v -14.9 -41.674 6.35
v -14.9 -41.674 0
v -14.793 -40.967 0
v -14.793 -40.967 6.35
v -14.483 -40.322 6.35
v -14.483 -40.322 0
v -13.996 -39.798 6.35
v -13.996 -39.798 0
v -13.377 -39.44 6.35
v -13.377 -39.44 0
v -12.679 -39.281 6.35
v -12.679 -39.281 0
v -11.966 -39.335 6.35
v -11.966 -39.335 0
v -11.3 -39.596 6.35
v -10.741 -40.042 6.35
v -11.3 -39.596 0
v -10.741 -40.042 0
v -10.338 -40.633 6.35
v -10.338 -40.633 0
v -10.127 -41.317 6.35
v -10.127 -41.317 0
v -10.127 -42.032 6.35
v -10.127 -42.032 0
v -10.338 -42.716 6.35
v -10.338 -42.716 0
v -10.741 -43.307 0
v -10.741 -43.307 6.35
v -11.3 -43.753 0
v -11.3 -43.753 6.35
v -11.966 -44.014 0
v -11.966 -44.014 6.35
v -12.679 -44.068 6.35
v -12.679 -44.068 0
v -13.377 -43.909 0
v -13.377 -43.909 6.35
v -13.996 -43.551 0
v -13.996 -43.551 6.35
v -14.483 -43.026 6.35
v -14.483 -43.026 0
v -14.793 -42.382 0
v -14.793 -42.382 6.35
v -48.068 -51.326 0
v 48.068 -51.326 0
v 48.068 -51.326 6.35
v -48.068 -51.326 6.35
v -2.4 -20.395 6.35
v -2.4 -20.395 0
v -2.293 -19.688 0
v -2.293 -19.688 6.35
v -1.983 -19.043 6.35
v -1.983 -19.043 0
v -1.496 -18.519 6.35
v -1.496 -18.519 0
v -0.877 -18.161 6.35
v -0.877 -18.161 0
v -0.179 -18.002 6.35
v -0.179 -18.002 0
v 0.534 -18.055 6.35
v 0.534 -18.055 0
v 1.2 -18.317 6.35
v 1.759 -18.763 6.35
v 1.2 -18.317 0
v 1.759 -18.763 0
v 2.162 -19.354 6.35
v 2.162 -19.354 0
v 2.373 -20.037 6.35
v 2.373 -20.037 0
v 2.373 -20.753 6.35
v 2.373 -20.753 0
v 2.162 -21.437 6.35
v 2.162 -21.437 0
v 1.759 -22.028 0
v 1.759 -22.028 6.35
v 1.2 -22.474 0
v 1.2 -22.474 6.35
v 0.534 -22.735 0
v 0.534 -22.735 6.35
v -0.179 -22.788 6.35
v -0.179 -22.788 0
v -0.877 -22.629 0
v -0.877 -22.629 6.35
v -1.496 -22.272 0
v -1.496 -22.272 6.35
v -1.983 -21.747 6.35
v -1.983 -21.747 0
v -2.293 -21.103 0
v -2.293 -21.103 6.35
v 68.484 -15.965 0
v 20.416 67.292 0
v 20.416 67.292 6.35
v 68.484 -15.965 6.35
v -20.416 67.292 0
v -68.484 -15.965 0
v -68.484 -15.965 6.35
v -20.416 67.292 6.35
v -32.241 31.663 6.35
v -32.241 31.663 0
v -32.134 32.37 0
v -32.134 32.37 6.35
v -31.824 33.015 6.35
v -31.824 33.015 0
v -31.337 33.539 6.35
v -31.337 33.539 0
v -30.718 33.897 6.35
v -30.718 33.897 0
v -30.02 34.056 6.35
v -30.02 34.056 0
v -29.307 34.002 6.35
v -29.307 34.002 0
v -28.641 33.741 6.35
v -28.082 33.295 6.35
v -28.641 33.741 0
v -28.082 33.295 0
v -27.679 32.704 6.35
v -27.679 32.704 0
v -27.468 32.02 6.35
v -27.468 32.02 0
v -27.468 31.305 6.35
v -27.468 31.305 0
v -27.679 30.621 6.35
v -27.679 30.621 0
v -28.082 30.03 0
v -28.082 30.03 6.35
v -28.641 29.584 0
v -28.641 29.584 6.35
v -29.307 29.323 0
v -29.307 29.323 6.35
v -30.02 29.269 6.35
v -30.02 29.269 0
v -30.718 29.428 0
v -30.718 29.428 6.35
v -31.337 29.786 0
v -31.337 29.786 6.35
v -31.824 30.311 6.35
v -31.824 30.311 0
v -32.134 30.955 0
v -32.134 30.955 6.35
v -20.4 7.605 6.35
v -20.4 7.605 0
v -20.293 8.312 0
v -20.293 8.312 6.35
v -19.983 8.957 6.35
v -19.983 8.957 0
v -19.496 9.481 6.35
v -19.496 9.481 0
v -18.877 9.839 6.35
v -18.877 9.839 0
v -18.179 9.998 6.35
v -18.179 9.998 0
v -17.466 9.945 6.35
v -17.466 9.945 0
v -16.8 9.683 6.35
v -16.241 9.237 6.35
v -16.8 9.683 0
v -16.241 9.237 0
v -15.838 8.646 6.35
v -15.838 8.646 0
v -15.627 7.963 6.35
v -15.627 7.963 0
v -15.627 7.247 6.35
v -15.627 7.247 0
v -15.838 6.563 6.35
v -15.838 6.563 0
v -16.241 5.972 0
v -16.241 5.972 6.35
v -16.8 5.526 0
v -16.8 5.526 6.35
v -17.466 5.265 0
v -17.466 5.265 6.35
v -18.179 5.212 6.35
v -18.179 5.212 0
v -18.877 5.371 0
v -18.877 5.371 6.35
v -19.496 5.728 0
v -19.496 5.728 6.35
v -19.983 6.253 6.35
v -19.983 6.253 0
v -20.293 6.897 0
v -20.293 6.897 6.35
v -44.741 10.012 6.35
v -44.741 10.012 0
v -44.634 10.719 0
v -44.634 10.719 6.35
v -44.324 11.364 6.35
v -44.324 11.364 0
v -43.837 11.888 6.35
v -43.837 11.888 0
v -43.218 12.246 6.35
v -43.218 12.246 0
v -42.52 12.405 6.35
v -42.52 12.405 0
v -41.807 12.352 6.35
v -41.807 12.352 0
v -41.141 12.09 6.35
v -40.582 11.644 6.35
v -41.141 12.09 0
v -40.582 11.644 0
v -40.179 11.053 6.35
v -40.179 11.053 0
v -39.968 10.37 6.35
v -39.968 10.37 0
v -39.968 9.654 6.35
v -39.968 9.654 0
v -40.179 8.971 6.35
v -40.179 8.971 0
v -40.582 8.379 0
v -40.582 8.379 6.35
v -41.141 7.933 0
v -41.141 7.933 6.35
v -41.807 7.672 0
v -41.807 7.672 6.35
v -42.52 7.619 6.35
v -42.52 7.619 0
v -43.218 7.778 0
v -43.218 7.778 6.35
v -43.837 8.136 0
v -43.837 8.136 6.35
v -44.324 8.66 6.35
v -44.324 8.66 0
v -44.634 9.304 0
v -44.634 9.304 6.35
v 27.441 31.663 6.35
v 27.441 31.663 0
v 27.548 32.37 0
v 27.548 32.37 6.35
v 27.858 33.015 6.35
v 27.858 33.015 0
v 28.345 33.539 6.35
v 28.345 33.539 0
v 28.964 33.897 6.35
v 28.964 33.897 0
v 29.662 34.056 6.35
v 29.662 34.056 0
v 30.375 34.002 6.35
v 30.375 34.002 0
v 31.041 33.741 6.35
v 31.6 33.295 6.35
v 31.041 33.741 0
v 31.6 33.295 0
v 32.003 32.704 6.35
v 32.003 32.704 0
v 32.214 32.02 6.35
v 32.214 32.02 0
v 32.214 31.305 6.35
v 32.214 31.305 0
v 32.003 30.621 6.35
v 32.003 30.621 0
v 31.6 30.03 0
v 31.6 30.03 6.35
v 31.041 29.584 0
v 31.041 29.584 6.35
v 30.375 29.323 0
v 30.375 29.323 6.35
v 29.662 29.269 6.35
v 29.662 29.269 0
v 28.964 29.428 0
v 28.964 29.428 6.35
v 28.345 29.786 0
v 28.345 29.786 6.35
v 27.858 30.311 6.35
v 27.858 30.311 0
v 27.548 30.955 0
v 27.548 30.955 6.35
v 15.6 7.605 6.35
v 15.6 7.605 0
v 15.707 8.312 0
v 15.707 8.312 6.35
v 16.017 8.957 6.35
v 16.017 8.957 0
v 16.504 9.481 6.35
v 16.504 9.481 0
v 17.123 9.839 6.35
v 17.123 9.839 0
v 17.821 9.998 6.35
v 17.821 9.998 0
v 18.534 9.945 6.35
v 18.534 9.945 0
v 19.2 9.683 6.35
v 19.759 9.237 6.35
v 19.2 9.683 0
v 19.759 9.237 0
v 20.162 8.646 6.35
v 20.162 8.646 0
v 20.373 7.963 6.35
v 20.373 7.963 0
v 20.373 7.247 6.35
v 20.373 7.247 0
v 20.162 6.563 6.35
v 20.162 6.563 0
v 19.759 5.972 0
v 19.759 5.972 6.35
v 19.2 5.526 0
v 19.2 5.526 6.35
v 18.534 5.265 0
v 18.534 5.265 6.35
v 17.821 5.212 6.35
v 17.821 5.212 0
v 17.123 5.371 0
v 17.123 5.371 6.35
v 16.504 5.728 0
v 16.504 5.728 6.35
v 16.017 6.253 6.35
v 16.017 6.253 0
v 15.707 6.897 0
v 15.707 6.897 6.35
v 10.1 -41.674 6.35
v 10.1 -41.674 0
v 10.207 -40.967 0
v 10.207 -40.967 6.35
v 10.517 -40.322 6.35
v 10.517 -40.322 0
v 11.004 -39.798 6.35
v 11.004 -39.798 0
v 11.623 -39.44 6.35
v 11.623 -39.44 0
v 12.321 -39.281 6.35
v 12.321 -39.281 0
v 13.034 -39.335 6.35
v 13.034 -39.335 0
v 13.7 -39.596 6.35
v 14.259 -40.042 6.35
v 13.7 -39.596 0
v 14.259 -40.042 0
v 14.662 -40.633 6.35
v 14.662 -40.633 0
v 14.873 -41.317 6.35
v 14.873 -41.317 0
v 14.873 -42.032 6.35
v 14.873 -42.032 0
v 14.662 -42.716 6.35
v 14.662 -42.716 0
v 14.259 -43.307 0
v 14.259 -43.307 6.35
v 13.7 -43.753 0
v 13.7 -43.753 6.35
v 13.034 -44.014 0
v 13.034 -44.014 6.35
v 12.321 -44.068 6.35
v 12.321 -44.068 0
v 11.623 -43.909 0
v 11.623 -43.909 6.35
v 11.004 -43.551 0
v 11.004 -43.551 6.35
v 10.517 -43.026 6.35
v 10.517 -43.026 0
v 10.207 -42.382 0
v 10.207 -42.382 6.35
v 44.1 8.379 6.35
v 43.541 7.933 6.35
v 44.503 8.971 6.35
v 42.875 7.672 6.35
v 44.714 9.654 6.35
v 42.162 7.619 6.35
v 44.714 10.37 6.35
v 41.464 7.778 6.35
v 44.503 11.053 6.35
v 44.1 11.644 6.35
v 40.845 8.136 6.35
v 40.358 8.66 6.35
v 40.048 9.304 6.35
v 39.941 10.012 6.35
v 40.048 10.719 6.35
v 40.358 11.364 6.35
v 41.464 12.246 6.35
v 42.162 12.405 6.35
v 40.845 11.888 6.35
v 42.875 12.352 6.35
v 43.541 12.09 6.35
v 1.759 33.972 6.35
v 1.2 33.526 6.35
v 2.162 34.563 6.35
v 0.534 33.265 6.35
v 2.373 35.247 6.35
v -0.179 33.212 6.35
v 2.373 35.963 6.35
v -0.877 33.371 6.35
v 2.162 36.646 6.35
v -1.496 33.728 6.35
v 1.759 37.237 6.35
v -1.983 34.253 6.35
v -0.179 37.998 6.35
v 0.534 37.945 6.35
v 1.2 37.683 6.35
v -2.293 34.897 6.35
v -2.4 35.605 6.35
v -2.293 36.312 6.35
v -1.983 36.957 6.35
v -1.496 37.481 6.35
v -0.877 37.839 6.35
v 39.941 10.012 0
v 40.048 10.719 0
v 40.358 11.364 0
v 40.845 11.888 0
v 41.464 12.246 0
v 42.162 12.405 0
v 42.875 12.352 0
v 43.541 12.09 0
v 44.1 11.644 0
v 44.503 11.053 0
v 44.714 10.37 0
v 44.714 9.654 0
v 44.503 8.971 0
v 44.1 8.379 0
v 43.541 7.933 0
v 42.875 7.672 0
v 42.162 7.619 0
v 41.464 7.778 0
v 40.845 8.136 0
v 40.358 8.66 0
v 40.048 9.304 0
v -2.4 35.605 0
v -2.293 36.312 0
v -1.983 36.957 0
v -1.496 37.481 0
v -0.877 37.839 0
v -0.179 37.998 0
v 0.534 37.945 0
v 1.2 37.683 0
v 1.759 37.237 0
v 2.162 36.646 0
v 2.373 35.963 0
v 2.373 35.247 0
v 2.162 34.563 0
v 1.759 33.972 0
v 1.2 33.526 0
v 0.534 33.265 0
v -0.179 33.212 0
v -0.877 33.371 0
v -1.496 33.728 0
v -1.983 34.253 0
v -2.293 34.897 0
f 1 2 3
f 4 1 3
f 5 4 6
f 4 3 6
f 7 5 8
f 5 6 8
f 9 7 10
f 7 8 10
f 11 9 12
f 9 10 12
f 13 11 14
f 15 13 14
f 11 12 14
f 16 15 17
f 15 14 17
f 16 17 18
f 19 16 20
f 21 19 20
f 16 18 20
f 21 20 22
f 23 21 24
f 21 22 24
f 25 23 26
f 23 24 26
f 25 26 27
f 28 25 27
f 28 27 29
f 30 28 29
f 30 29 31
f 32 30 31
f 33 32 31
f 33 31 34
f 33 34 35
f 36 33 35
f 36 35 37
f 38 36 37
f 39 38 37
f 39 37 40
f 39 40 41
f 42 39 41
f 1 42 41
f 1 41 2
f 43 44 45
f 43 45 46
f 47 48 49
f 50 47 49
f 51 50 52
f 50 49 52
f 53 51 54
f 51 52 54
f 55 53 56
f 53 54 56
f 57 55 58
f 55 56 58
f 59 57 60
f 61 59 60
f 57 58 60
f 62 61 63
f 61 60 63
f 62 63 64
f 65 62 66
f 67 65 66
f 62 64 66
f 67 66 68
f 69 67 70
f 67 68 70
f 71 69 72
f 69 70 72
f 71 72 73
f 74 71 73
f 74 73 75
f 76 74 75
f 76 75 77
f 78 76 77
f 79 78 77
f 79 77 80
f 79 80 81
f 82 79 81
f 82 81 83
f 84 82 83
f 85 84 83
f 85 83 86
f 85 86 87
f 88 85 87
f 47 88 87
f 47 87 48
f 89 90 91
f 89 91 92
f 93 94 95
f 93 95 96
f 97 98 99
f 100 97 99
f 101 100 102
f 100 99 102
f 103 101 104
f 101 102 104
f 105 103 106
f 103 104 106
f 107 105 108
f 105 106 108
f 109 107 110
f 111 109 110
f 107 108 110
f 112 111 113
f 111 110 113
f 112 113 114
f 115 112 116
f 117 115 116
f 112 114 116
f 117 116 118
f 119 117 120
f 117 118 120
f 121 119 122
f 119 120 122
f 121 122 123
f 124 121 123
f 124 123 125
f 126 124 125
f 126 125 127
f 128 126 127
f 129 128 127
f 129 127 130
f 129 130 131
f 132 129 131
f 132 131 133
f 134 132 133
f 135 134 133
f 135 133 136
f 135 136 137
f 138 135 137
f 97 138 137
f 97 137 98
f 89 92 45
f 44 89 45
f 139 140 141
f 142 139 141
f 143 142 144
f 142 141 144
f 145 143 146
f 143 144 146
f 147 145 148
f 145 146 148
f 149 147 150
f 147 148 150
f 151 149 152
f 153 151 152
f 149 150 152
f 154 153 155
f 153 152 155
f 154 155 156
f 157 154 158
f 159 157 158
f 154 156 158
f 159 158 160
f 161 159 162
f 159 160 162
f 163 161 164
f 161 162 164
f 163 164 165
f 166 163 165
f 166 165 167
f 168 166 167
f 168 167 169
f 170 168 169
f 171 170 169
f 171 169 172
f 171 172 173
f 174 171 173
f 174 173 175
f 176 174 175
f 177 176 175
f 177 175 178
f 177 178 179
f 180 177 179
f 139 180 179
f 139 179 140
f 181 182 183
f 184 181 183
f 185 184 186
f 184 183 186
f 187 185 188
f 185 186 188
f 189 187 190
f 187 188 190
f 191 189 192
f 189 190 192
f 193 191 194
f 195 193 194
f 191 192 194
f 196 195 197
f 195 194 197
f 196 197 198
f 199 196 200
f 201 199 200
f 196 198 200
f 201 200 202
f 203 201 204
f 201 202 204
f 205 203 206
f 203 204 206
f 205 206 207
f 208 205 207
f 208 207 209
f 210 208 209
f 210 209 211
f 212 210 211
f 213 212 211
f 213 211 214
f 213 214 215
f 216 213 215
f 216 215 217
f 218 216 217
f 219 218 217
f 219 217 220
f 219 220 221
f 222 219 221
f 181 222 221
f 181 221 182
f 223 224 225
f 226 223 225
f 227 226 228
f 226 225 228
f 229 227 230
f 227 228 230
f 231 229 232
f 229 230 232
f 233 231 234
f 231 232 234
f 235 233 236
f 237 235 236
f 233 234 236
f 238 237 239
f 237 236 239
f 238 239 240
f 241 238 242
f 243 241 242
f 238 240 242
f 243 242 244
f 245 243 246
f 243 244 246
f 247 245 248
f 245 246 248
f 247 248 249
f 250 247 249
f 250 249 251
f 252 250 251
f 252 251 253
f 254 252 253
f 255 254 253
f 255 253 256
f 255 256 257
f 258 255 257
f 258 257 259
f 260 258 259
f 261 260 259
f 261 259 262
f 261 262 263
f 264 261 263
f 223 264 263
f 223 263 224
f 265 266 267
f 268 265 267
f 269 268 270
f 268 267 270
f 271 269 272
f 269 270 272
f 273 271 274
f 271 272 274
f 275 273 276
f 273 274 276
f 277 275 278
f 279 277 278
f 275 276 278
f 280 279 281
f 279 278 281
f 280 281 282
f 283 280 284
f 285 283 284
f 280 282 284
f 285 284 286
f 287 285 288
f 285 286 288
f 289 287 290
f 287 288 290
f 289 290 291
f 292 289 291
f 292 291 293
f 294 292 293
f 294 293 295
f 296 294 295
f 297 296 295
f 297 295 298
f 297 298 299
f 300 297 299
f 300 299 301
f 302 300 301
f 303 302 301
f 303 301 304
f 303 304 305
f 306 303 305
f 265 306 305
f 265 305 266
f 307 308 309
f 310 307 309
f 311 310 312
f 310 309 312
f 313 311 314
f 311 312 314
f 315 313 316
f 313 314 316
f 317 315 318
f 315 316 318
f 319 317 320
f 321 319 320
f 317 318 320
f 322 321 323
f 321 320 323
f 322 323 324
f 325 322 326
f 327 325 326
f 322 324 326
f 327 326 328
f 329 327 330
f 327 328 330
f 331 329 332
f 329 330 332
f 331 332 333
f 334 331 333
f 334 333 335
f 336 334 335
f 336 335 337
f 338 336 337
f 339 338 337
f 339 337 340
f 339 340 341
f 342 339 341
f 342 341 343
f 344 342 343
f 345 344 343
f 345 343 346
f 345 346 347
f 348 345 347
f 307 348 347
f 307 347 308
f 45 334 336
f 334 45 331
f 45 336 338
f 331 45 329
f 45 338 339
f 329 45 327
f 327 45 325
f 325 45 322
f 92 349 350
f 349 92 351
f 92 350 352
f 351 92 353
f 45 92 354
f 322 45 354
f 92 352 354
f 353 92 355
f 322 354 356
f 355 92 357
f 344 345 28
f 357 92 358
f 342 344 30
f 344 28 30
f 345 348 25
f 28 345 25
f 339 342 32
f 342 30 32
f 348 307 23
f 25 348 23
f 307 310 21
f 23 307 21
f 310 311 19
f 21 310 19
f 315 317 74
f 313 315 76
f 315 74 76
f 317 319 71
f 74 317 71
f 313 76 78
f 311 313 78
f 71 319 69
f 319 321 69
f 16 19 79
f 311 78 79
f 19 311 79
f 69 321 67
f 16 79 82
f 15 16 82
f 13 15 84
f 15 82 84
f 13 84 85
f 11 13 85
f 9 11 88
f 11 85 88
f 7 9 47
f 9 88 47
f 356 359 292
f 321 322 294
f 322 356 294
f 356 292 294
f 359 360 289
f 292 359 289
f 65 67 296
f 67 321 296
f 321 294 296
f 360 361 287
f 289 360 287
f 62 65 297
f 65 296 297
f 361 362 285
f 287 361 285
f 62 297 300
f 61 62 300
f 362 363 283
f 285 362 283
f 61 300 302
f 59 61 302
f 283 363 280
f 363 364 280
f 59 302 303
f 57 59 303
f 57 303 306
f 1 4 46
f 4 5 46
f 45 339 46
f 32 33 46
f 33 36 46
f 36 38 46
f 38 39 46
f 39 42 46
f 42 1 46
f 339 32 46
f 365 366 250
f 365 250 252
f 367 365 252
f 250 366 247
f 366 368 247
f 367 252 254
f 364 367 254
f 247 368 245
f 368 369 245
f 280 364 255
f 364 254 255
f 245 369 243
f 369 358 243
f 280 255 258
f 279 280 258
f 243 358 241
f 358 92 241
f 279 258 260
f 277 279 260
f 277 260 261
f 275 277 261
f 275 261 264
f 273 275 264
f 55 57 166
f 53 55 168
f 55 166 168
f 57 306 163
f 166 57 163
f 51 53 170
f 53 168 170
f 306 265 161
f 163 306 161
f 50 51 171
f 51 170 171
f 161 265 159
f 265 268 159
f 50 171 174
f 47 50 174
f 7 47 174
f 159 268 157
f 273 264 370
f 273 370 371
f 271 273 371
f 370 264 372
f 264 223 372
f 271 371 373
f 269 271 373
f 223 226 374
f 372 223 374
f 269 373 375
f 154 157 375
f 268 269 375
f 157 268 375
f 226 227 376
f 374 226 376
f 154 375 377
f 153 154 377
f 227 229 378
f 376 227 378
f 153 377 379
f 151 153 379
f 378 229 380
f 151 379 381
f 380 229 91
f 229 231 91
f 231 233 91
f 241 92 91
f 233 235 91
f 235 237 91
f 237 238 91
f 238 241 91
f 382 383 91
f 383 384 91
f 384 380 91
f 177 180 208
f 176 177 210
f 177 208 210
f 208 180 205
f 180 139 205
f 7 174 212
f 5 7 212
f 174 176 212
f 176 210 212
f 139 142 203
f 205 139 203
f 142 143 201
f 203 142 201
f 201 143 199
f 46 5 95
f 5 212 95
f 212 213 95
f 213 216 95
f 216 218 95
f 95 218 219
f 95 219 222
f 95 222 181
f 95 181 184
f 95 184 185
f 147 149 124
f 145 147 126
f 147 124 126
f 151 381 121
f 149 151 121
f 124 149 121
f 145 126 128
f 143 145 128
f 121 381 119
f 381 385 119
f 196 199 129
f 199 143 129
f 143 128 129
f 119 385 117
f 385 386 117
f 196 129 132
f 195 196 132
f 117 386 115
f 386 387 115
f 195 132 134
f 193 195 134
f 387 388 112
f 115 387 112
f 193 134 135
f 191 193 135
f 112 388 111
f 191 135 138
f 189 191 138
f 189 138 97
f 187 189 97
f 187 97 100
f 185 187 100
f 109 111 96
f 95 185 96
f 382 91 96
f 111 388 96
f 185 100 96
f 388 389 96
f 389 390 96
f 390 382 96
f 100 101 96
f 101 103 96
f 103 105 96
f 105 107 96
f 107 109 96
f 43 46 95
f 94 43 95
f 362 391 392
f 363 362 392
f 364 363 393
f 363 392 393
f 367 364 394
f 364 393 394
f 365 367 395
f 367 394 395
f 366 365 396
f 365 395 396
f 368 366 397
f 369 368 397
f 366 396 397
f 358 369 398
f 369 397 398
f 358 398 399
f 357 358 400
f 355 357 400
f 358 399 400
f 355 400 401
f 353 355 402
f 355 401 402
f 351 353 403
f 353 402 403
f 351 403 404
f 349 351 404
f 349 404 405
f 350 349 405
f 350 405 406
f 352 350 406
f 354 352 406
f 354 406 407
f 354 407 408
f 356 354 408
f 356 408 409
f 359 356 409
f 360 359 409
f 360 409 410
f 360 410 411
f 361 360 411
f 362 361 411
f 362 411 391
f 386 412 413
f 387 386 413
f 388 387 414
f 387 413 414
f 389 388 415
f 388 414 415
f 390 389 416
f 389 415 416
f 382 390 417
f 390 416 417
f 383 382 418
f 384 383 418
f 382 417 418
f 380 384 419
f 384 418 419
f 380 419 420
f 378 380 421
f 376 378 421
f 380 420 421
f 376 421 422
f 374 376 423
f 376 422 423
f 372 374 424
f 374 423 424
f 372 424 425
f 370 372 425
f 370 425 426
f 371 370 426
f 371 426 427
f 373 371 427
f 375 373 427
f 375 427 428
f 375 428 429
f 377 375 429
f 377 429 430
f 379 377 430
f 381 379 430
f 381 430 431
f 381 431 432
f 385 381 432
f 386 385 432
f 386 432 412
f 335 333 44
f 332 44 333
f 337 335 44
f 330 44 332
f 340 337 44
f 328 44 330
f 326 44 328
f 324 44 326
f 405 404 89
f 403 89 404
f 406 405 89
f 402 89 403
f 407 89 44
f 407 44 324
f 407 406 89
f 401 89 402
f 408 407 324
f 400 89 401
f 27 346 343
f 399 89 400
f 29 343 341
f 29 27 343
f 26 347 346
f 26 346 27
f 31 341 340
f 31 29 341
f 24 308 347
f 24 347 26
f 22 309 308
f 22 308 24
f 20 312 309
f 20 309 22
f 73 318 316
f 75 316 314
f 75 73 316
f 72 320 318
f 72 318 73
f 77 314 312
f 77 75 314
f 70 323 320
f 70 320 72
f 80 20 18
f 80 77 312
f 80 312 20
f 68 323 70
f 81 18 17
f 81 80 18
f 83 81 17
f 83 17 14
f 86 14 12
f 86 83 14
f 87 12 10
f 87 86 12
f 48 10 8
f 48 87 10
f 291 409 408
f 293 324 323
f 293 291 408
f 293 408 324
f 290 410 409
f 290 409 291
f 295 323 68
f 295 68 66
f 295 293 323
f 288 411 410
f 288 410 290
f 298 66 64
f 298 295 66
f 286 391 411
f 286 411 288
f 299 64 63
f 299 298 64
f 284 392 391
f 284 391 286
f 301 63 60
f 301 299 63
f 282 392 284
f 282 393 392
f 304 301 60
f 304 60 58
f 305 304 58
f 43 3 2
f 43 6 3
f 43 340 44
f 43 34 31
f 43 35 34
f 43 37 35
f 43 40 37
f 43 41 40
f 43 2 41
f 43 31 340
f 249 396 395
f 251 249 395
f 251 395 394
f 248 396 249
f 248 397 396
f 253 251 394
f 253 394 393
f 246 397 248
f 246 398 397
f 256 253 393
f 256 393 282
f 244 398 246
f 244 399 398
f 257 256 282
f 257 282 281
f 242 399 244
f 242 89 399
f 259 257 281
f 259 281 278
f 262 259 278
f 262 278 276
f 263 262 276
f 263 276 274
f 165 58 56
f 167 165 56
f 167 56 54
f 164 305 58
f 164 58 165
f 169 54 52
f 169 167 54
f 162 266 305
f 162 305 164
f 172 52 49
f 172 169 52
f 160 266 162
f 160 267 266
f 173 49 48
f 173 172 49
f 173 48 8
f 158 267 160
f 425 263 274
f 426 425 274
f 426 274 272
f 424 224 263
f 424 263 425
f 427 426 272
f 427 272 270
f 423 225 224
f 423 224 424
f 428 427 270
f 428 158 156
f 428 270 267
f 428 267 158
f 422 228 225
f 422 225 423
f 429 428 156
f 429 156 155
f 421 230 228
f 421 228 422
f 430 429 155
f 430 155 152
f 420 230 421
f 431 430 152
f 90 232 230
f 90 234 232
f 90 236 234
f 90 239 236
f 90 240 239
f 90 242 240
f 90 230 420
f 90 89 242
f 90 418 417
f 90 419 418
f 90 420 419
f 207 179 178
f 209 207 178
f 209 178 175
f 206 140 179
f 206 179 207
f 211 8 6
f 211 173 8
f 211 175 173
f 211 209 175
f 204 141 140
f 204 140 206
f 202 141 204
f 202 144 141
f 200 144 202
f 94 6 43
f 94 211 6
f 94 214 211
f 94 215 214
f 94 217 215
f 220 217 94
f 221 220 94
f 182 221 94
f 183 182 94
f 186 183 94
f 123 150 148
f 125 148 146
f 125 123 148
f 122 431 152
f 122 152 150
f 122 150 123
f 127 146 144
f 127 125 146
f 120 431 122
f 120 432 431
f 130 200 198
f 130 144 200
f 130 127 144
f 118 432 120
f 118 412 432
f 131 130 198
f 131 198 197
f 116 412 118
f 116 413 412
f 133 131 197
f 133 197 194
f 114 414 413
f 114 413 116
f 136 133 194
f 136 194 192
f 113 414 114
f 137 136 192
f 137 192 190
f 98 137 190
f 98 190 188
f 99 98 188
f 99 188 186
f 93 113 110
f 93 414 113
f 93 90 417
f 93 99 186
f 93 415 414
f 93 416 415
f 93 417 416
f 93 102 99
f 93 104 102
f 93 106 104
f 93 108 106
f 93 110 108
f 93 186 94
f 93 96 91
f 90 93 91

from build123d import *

# Parameters (mm, degrees)
BOSS_EXTRU_1_DEPTH      = 6.35
ENL_V_MAT_EXTRU_1_DEPTH = 136.945378124
D_GAGEMENT_M41_D        = 4.8
D_GAGEMENT_M43_D        = 4.8


with BuildPart() as part:
    # Esquisse1 → Boss.-Extru.1 (new body)
    with BuildSketch(Plane.XY):
        Polygon((-88.9, -51.326438931), (0, 102.652877862), (88.9, -51.326438931), align=None)
    extrude(amount=BOSS_EXTRU_1_DEPTH)

    # Esquisse2 → Enlèv. mat.-Extru.1 (cut, through all)
    with BuildSketch(Plane.XY.offset(6.35)):
        Polygon((-20.415865769, 67.291561069), (20.415865769, 67.291561069), (0, 102.652877862), align=None)
        Polygon((48.068268461, -51.326438931), (88.9, -51.326438931), (68.484134231, -15.965122138), align=None)
        Polygon((-68.484134231, -15.965122138), (-88.9, -51.326438931), (-48.068268461, -51.326438931), align=None)
    extrude(amount=-ENL_V_MAT_EXTRU_1_DEPTH, mode=Mode.SUBTRACT)

    # Dégagement M41 (through all)
    with Locations(Plane.XY.offset(6.35)):
        with Locations((12.5, -41.674438931), (-12.5, -41.674438931), (-42.341122803, 10.011901918), (-29.841122803, 31.662537013), (29.841122803, 31.662537013), (42.341122803, 10.011901918)):
            Hole(D_GAGEMENT_M41_D / 2)

    # Dégagement M43 (through all)
    with Locations(Plane.XY.offset(6.35)):
        with Locations((0, 35.6048), (0, -20.3952), (18, 7.6048), (-18, 7.6048)):
            Hole(D_GAGEMENT_M43_D / 2)


solid = part.part
